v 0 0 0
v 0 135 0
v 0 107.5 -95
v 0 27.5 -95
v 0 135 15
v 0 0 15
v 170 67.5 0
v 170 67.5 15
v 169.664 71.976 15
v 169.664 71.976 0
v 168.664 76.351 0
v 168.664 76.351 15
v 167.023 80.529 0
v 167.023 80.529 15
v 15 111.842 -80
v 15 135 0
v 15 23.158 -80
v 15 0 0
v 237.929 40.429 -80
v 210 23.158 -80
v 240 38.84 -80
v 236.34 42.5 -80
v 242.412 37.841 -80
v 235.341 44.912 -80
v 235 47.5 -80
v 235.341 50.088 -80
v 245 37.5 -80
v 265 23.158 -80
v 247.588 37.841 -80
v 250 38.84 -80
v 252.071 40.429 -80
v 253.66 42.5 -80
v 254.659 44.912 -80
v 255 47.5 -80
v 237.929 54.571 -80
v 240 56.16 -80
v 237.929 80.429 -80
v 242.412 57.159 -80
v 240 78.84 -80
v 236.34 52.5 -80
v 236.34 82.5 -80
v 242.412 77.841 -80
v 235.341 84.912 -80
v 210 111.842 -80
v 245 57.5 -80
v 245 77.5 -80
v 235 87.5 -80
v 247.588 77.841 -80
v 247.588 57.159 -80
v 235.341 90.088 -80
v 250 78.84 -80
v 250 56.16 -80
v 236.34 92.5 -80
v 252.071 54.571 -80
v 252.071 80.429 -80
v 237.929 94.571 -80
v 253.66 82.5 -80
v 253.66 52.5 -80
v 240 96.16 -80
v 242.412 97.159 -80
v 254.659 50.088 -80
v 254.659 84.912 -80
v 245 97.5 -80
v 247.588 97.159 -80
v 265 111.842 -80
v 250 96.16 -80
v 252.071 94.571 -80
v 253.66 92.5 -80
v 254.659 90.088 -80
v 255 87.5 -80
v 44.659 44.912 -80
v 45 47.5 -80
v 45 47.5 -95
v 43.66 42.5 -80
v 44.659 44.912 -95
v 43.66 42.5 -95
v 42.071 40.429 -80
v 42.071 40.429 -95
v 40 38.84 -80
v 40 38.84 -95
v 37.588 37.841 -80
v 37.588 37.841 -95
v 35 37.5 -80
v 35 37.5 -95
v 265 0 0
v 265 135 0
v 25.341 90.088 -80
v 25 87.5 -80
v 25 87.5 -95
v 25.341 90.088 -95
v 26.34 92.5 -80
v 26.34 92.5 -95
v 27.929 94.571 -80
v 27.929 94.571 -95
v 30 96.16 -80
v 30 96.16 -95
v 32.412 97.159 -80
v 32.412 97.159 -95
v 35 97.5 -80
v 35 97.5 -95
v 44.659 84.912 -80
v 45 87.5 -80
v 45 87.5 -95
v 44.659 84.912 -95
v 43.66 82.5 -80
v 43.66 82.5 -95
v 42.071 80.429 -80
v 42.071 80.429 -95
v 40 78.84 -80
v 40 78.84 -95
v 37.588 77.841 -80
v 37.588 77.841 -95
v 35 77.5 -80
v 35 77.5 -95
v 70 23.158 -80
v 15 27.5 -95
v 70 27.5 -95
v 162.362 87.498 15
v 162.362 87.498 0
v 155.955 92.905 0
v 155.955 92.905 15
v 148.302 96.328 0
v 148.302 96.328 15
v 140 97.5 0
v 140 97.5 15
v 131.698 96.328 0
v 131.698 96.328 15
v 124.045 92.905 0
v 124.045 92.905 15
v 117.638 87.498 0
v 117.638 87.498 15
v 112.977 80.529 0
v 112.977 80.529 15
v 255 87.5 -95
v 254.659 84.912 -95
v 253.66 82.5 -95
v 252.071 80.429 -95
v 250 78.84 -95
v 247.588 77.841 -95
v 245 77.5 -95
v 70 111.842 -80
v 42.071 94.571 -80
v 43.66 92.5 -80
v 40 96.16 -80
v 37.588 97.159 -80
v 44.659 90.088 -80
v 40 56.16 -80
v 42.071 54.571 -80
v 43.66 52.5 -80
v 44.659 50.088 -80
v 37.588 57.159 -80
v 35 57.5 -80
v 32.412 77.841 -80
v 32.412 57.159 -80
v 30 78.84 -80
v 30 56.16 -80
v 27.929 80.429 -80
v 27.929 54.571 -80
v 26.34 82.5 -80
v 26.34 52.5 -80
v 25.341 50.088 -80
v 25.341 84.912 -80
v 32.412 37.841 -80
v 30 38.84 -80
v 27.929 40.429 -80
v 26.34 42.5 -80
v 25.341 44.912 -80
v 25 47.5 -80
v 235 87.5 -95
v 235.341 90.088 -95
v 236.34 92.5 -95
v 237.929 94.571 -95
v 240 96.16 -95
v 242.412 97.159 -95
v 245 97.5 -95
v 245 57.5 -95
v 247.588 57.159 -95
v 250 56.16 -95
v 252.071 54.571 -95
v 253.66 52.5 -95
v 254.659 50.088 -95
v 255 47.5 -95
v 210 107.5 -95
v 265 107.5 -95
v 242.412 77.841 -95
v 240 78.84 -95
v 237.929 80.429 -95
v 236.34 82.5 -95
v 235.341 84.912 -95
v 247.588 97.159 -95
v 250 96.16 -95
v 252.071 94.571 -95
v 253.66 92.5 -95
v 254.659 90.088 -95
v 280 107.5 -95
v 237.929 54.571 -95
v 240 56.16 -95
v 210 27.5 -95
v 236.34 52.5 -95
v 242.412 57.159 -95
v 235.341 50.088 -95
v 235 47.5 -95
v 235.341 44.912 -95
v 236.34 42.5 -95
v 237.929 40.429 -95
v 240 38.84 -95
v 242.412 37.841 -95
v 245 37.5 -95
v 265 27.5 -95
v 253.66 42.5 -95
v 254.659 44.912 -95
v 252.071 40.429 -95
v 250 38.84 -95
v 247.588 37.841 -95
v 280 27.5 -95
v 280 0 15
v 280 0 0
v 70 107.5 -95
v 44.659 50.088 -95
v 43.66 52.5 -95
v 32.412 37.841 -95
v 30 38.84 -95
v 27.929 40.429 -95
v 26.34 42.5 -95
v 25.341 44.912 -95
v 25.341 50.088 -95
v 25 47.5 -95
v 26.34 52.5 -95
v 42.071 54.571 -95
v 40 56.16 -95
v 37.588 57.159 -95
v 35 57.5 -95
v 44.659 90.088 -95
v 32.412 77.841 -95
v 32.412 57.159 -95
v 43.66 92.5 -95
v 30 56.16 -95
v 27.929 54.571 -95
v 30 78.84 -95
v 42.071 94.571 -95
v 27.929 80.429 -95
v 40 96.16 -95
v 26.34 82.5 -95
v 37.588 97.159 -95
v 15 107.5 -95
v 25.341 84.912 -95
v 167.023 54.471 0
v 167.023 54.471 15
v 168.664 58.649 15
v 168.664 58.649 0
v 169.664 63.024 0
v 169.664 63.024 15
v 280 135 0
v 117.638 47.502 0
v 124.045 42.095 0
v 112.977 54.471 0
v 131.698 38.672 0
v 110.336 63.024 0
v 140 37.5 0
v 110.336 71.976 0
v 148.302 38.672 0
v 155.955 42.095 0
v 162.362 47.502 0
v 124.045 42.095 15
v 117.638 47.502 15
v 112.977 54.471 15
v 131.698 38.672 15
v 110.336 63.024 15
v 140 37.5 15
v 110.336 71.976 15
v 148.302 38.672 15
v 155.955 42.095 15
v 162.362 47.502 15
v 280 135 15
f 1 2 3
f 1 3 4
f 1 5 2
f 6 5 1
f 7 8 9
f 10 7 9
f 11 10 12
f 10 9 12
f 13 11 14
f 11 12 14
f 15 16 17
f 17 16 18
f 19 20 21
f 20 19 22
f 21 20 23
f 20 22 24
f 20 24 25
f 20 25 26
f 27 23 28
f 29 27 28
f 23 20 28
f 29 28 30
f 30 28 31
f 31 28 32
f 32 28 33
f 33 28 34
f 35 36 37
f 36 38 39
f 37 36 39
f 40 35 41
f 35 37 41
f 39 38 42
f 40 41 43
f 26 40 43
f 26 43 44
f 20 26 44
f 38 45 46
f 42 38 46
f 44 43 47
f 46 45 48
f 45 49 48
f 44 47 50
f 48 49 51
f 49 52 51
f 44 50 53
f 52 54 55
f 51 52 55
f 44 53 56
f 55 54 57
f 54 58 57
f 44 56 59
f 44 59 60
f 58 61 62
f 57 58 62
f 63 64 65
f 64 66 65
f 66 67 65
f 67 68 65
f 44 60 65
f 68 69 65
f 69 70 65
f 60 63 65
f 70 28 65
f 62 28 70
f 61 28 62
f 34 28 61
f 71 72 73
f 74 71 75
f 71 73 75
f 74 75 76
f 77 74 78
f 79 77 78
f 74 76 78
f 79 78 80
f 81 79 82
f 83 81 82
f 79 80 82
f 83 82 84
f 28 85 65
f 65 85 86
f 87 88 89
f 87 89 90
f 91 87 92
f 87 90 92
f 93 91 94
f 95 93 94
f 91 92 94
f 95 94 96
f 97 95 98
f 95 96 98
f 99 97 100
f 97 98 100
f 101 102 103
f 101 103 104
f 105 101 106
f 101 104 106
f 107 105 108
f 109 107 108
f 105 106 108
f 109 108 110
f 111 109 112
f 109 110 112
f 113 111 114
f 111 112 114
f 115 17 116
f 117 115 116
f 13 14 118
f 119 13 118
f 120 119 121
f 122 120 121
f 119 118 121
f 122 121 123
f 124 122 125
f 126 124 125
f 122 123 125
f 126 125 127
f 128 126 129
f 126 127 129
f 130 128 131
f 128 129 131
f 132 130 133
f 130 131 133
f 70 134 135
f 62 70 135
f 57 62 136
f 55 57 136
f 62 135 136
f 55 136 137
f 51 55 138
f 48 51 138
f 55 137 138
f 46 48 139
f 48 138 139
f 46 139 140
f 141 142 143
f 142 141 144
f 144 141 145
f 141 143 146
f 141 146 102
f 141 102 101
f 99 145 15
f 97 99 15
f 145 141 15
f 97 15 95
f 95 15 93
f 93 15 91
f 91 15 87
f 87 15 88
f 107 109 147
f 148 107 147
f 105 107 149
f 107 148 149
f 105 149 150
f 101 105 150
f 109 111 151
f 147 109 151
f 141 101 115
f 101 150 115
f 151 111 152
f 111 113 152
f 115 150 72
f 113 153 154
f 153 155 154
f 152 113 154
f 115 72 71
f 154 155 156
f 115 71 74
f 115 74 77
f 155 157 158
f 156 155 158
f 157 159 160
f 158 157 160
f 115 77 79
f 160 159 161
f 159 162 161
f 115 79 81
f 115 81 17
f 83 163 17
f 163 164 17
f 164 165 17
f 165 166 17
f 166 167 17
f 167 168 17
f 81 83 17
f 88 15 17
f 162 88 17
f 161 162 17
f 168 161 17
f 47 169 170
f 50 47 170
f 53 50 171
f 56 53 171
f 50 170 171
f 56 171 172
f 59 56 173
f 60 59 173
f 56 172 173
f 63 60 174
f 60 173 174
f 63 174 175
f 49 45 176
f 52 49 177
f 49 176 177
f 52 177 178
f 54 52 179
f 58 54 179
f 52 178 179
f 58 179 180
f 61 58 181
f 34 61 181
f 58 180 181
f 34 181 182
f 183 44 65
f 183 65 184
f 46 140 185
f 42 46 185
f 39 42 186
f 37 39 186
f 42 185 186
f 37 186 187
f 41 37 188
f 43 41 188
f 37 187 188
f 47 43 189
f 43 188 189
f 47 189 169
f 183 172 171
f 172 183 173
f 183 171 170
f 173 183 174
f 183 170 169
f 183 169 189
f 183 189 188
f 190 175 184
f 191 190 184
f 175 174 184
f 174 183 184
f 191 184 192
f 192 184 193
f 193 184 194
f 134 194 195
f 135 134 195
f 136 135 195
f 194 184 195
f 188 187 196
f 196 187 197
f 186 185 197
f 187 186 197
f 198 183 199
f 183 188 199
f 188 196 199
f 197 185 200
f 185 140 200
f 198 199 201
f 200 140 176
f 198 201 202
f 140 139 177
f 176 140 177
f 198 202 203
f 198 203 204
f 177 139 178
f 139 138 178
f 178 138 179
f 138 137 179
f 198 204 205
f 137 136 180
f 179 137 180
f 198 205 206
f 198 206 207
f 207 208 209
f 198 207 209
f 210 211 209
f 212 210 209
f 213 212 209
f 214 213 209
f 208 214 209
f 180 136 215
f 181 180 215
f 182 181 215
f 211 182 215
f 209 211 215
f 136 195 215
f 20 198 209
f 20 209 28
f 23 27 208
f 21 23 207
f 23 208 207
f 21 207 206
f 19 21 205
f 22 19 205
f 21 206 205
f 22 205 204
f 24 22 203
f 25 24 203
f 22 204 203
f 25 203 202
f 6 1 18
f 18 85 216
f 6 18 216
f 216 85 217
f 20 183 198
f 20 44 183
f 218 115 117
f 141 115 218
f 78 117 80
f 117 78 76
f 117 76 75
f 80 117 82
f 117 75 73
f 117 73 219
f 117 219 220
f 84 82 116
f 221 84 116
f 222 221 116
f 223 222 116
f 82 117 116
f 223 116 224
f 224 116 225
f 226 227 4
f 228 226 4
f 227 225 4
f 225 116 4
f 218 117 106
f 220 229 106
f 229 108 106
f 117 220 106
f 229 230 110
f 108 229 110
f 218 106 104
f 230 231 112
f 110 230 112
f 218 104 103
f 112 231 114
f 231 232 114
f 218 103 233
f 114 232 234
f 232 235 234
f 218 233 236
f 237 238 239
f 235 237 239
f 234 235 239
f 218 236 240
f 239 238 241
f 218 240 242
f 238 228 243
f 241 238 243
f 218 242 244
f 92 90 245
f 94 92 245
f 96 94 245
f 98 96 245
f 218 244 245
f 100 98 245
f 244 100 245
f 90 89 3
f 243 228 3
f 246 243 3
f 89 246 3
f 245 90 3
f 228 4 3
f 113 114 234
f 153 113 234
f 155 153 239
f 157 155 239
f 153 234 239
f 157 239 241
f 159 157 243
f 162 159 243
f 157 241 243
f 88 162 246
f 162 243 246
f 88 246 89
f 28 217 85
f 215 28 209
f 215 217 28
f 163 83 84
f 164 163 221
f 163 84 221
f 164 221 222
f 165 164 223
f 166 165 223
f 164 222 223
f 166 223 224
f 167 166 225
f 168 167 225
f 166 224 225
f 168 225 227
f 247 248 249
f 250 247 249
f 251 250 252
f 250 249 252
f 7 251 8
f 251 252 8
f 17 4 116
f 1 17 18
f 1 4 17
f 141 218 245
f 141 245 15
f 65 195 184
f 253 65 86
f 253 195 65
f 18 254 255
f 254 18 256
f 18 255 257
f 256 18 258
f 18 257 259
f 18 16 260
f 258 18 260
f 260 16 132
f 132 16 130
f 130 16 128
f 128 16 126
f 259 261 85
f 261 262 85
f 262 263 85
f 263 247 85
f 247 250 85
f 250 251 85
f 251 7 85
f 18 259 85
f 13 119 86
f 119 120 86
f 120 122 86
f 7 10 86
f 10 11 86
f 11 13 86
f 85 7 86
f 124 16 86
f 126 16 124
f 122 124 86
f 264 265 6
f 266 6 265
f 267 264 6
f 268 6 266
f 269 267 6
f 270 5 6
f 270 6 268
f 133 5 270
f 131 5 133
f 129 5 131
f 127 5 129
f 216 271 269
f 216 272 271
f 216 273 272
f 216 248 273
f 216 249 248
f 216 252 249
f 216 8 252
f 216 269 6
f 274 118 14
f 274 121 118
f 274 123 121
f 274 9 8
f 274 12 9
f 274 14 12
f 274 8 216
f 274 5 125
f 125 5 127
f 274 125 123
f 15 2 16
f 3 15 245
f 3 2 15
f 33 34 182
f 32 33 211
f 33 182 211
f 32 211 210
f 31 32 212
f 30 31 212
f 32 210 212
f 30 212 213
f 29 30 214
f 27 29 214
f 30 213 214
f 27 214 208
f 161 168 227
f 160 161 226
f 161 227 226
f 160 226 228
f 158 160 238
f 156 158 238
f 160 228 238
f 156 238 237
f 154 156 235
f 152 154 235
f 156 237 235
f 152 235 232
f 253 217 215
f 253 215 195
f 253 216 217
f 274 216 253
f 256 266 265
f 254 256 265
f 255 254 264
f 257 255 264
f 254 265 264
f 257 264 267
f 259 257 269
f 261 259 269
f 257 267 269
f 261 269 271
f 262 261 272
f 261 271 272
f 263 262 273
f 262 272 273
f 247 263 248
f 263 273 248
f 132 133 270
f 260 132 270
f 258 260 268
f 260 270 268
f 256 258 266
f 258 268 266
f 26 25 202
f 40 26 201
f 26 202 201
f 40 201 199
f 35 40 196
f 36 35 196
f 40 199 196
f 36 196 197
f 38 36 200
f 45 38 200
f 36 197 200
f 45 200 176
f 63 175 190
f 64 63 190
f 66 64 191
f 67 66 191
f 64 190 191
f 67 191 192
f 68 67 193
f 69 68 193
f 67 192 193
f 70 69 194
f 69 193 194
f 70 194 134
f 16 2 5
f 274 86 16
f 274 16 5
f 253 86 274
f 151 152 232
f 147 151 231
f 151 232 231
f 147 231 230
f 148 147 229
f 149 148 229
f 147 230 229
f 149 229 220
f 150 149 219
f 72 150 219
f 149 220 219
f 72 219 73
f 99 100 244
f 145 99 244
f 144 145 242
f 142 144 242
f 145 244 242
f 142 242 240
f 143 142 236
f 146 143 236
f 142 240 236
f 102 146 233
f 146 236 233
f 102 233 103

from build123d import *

# Parameters (mm, degrees)
F0_W      = 280
F0_H      = 135
F1_DEPTH  = 15
F3_DEPTH  = 15
F4_W      = 135
F4_H      = 15
F5_DEPTH  = 15
F7_DEPTH  = 110.001
F9_DEPTH  = 55
F11_DEPTH = 55
F13_DEPTH = 25


with BuildPart() as f1:
    # F0 (on Top) → F1 (new body)
    with BuildSketch(Plane.XY):
        with Locations((140, 67.5)):
            Rectangle(F0_W, F0_H)
    extrude(amount=F1_DEPTH)

    # F2 (on face) → F3 (join)
    with BuildSketch(Plane(origin=(0, 0, 0), x_dir=(0, -1, 0), z_dir=(-1, 0, 0))):
        Polygon((0, 0), (-135, 0), (-107.5, -95), (-67.5, -95), (-27.5, -95), align=None)
    extrude(amount=-F3_DEPTH)

    # F4 (on face) → F5 (join)
    with BuildSketch(Plane.YZ.offset(280)):
        Polygon((27.5, -95), (67.5, -95), (107.5, -95), (135, 0), (0, 0), align=None)
        with Locations((67.5, 7.5)):
            Rectangle(F4_W, F4_H)
    extrude(amount=-F5_DEPTH)

    # F6 (on face) → F7 (cut, through all)
    with BuildSketch(Plane.XY.offset(15)):
        with BuildLine():
            ThreePointArc((112.9769395589, 54.4710244302), (140, 37.5), (167.0230604411, 54.4710244302))
            Line((167.0230604411, 54.4710244302), (140, 67.5))
            Line((140, 67.5), (112.9769395589, 54.4710244302))
        make_face()
        with BuildLine():
            Line((140, 67.5), (167.0230604411, 54.4710244302))
            ThreePointArc((167.0230604411, 54.4710244302), (169.2462973146, 60.8176281618), (170, 67.5))
            ThreePointArc((170, 67.5), (169.2462973146, 74.1823718382), (167.0230604411, 80.5289755698))
            Line((167.0230604411, 80.5289755698), (140, 67.5))
        make_face()
        with BuildLine():
            Line((112.9769395589, 54.4710244302), (140, 67.5))
            Line((140, 67.5), (112.9769395589, 80.5289755698))
            ThreePointArc((112.9769395589, 80.5289755698), (110, 67.5), (112.9769395589, 54.4710244302))
        make_face()
        with BuildLine():
            Line((112.9769395589, 80.5289755698), (140, 67.5))
            Line((140, 67.5), (167.0230604411, 80.5289755698))
            ThreePointArc((167.0230604411, 80.5289755698), (140, 97.5), (112.9769395589, 80.5289755698))
        make_face()
    extrude(amount=-F7_DEPTH, mode=Mode.SUBTRACT)

    # F8 (on face) → F9 (join)
    with BuildSketch(Plane.YZ.offset(15)):
        Polygon((111.8421052632, -80), (27.5, -80), (23.1578947368, -80), (27.5, -95), (107.5, -95), align=None)
    extrude(amount=F9_DEPTH)

    # F10 (on face) → F11 (join)
    with BuildSketch(Plane(origin=(265, 0, 0), x_dir=(0, -1, 0), z_dir=(-1, 0, 0))):
        Polygon((-107.5, -95), (-67.5, -95), (-67.5, -80), (-111.8421052632, -80), align=None)
        Polygon((-67.5, -80), (-67.5, -95), (-27.5, -95), (-23.1578947368, -80), align=None)
    extrude(amount=F11_DEPTH)

    # F12 (on face) → F13 (cut)
    with BuildSketch(Plane(origin=(0, 0, -95), x_dir=(1, 0, 0), z_dir=(0, 0, -1))):
        with BuildLine():
            ThreePointArc((35, -97.5), (42.0710678119, -94.5710678119), (45, -87.5))
            Line((45, -87.5), (35, -87.5))
            Line((35, -87.5), (35, -97.5))
        make_face()
        with BuildLine():
            Line((245, -77.5), (245, -87.5))
            Line((245, -87.5), (255, -87.5))
            ThreePointArc((255, -87.5), (252.0710678119, -80.4289321881), (245, -77.5))
        make_face()
        with BuildLine():
            ThreePointArc((245, -77.5), (237.9289321881, -80.4289321881), (235, -87.5))
            Line((235, -87.5), (245, -87.5))
            Line((245, -87.5), (245, -77.5))
        make_face()
        with BuildLine():
            Line((255, -87.5), (245, -87.5))
            Line((245, -87.5), (245, -97.5))
            ThreePointArc((245, -97.5), (252.0710678119, -94.5710678119), (255, -87.5))
        make_face()
        with BuildLine():
            Line((245, -87.5), (235, -87.5))
            ThreePointArc((235, -87.5), (237.9289321881, -94.5710678119), (245, -97.5))
            Line((245, -97.5), (245, -87.5))
        make_face()
        with BuildLine():
            Line((35, -87.5), (45, -87.5))
            ThreePointArc((45, -87.5), (42.0710678119, -80.4289321881), (35, -77.5))
            Line((35, -77.5), (35, -87.5))
        make_face()
        with BuildLine():
            Line((35, -97.5), (35, -87.5))
            Line((35, -87.5), (25, -87.5))
            ThreePointArc((25, -87.5), (27.9289321881, -94.5710678119), (35, -97.5))
        make_face()
        with BuildLine():
            Line((35, -87.5), (35, -77.5))
            ThreePointArc((35, -77.5), (27.9289321881, -80.4289321881), (25, -87.5))
            Line((25, -87.5), (35, -87.5))
        make_face()
        with BuildLine():
            ThreePointArc((35, -57.5), (42.0710678119, -54.5710678119), (45, -47.5))
            Line((45, -47.5), (35, -47.5))
            Line((35, -47.5), (35, -57.5))
        make_face()
        with BuildLine():
            Line((35, -57.5), (35, -47.5))
            Line((35, -47.5), (25, -47.5))
            ThreePointArc((25, -47.5), (27.9289321881, -54.5710678119), (35, -57.5))
        make_face()
        with BuildLine():
            Line((35, -47.5), (35, -37.5))
            ThreePointArc((35, -37.5), (27.9289321881, -40.4289321881), (25, -47.5))
            Line((25, -47.5), (35, -47.5))
        make_face()
        with BuildLine():
            ThreePointArc((45, -47.5), (42.0710678119, -40.4289321881), (35, -37.5))
            Line((35, -37.5), (35, -47.5))
            Line((35, -47.5), (45, -47.5))
        make_face()
        with BuildLine():
            Line((245, -47.5), (235, -47.5))
            ThreePointArc((235, -47.5), (237.9289321881, -54.5710678119), (245, -57.5))
            Line((245, -57.5), (245, -47.5))
        make_face()
        with BuildLine():
            Line((255, -47.5), (245, -47.5))
            Line((245, -47.5), (245, -57.5))
            ThreePointArc((245, -57.5), (252.0710678119, -54.5710678119), (255, -47.5))
        make_face()
        with BuildLine():
            ThreePointArc((255, -47.5), (252.0710678119, -40.4289321881), (245, -37.5))
            Line((245, -37.5), (245, -47.5))
            Line((245, -47.5), (255, -47.5))
        make_face()
        with BuildLine():
            Line((245, -47.5), (245, -37.5))
            ThreePointArc((245, -37.5), (237.9289321881, -40.4289321881), (235, -47.5))
            Line((235, -47.5), (245, -47.5))
        make_face()
    extrude(amount=-F13_DEPTH, mode=Mode.SUBTRACT)


solid = f1.part
